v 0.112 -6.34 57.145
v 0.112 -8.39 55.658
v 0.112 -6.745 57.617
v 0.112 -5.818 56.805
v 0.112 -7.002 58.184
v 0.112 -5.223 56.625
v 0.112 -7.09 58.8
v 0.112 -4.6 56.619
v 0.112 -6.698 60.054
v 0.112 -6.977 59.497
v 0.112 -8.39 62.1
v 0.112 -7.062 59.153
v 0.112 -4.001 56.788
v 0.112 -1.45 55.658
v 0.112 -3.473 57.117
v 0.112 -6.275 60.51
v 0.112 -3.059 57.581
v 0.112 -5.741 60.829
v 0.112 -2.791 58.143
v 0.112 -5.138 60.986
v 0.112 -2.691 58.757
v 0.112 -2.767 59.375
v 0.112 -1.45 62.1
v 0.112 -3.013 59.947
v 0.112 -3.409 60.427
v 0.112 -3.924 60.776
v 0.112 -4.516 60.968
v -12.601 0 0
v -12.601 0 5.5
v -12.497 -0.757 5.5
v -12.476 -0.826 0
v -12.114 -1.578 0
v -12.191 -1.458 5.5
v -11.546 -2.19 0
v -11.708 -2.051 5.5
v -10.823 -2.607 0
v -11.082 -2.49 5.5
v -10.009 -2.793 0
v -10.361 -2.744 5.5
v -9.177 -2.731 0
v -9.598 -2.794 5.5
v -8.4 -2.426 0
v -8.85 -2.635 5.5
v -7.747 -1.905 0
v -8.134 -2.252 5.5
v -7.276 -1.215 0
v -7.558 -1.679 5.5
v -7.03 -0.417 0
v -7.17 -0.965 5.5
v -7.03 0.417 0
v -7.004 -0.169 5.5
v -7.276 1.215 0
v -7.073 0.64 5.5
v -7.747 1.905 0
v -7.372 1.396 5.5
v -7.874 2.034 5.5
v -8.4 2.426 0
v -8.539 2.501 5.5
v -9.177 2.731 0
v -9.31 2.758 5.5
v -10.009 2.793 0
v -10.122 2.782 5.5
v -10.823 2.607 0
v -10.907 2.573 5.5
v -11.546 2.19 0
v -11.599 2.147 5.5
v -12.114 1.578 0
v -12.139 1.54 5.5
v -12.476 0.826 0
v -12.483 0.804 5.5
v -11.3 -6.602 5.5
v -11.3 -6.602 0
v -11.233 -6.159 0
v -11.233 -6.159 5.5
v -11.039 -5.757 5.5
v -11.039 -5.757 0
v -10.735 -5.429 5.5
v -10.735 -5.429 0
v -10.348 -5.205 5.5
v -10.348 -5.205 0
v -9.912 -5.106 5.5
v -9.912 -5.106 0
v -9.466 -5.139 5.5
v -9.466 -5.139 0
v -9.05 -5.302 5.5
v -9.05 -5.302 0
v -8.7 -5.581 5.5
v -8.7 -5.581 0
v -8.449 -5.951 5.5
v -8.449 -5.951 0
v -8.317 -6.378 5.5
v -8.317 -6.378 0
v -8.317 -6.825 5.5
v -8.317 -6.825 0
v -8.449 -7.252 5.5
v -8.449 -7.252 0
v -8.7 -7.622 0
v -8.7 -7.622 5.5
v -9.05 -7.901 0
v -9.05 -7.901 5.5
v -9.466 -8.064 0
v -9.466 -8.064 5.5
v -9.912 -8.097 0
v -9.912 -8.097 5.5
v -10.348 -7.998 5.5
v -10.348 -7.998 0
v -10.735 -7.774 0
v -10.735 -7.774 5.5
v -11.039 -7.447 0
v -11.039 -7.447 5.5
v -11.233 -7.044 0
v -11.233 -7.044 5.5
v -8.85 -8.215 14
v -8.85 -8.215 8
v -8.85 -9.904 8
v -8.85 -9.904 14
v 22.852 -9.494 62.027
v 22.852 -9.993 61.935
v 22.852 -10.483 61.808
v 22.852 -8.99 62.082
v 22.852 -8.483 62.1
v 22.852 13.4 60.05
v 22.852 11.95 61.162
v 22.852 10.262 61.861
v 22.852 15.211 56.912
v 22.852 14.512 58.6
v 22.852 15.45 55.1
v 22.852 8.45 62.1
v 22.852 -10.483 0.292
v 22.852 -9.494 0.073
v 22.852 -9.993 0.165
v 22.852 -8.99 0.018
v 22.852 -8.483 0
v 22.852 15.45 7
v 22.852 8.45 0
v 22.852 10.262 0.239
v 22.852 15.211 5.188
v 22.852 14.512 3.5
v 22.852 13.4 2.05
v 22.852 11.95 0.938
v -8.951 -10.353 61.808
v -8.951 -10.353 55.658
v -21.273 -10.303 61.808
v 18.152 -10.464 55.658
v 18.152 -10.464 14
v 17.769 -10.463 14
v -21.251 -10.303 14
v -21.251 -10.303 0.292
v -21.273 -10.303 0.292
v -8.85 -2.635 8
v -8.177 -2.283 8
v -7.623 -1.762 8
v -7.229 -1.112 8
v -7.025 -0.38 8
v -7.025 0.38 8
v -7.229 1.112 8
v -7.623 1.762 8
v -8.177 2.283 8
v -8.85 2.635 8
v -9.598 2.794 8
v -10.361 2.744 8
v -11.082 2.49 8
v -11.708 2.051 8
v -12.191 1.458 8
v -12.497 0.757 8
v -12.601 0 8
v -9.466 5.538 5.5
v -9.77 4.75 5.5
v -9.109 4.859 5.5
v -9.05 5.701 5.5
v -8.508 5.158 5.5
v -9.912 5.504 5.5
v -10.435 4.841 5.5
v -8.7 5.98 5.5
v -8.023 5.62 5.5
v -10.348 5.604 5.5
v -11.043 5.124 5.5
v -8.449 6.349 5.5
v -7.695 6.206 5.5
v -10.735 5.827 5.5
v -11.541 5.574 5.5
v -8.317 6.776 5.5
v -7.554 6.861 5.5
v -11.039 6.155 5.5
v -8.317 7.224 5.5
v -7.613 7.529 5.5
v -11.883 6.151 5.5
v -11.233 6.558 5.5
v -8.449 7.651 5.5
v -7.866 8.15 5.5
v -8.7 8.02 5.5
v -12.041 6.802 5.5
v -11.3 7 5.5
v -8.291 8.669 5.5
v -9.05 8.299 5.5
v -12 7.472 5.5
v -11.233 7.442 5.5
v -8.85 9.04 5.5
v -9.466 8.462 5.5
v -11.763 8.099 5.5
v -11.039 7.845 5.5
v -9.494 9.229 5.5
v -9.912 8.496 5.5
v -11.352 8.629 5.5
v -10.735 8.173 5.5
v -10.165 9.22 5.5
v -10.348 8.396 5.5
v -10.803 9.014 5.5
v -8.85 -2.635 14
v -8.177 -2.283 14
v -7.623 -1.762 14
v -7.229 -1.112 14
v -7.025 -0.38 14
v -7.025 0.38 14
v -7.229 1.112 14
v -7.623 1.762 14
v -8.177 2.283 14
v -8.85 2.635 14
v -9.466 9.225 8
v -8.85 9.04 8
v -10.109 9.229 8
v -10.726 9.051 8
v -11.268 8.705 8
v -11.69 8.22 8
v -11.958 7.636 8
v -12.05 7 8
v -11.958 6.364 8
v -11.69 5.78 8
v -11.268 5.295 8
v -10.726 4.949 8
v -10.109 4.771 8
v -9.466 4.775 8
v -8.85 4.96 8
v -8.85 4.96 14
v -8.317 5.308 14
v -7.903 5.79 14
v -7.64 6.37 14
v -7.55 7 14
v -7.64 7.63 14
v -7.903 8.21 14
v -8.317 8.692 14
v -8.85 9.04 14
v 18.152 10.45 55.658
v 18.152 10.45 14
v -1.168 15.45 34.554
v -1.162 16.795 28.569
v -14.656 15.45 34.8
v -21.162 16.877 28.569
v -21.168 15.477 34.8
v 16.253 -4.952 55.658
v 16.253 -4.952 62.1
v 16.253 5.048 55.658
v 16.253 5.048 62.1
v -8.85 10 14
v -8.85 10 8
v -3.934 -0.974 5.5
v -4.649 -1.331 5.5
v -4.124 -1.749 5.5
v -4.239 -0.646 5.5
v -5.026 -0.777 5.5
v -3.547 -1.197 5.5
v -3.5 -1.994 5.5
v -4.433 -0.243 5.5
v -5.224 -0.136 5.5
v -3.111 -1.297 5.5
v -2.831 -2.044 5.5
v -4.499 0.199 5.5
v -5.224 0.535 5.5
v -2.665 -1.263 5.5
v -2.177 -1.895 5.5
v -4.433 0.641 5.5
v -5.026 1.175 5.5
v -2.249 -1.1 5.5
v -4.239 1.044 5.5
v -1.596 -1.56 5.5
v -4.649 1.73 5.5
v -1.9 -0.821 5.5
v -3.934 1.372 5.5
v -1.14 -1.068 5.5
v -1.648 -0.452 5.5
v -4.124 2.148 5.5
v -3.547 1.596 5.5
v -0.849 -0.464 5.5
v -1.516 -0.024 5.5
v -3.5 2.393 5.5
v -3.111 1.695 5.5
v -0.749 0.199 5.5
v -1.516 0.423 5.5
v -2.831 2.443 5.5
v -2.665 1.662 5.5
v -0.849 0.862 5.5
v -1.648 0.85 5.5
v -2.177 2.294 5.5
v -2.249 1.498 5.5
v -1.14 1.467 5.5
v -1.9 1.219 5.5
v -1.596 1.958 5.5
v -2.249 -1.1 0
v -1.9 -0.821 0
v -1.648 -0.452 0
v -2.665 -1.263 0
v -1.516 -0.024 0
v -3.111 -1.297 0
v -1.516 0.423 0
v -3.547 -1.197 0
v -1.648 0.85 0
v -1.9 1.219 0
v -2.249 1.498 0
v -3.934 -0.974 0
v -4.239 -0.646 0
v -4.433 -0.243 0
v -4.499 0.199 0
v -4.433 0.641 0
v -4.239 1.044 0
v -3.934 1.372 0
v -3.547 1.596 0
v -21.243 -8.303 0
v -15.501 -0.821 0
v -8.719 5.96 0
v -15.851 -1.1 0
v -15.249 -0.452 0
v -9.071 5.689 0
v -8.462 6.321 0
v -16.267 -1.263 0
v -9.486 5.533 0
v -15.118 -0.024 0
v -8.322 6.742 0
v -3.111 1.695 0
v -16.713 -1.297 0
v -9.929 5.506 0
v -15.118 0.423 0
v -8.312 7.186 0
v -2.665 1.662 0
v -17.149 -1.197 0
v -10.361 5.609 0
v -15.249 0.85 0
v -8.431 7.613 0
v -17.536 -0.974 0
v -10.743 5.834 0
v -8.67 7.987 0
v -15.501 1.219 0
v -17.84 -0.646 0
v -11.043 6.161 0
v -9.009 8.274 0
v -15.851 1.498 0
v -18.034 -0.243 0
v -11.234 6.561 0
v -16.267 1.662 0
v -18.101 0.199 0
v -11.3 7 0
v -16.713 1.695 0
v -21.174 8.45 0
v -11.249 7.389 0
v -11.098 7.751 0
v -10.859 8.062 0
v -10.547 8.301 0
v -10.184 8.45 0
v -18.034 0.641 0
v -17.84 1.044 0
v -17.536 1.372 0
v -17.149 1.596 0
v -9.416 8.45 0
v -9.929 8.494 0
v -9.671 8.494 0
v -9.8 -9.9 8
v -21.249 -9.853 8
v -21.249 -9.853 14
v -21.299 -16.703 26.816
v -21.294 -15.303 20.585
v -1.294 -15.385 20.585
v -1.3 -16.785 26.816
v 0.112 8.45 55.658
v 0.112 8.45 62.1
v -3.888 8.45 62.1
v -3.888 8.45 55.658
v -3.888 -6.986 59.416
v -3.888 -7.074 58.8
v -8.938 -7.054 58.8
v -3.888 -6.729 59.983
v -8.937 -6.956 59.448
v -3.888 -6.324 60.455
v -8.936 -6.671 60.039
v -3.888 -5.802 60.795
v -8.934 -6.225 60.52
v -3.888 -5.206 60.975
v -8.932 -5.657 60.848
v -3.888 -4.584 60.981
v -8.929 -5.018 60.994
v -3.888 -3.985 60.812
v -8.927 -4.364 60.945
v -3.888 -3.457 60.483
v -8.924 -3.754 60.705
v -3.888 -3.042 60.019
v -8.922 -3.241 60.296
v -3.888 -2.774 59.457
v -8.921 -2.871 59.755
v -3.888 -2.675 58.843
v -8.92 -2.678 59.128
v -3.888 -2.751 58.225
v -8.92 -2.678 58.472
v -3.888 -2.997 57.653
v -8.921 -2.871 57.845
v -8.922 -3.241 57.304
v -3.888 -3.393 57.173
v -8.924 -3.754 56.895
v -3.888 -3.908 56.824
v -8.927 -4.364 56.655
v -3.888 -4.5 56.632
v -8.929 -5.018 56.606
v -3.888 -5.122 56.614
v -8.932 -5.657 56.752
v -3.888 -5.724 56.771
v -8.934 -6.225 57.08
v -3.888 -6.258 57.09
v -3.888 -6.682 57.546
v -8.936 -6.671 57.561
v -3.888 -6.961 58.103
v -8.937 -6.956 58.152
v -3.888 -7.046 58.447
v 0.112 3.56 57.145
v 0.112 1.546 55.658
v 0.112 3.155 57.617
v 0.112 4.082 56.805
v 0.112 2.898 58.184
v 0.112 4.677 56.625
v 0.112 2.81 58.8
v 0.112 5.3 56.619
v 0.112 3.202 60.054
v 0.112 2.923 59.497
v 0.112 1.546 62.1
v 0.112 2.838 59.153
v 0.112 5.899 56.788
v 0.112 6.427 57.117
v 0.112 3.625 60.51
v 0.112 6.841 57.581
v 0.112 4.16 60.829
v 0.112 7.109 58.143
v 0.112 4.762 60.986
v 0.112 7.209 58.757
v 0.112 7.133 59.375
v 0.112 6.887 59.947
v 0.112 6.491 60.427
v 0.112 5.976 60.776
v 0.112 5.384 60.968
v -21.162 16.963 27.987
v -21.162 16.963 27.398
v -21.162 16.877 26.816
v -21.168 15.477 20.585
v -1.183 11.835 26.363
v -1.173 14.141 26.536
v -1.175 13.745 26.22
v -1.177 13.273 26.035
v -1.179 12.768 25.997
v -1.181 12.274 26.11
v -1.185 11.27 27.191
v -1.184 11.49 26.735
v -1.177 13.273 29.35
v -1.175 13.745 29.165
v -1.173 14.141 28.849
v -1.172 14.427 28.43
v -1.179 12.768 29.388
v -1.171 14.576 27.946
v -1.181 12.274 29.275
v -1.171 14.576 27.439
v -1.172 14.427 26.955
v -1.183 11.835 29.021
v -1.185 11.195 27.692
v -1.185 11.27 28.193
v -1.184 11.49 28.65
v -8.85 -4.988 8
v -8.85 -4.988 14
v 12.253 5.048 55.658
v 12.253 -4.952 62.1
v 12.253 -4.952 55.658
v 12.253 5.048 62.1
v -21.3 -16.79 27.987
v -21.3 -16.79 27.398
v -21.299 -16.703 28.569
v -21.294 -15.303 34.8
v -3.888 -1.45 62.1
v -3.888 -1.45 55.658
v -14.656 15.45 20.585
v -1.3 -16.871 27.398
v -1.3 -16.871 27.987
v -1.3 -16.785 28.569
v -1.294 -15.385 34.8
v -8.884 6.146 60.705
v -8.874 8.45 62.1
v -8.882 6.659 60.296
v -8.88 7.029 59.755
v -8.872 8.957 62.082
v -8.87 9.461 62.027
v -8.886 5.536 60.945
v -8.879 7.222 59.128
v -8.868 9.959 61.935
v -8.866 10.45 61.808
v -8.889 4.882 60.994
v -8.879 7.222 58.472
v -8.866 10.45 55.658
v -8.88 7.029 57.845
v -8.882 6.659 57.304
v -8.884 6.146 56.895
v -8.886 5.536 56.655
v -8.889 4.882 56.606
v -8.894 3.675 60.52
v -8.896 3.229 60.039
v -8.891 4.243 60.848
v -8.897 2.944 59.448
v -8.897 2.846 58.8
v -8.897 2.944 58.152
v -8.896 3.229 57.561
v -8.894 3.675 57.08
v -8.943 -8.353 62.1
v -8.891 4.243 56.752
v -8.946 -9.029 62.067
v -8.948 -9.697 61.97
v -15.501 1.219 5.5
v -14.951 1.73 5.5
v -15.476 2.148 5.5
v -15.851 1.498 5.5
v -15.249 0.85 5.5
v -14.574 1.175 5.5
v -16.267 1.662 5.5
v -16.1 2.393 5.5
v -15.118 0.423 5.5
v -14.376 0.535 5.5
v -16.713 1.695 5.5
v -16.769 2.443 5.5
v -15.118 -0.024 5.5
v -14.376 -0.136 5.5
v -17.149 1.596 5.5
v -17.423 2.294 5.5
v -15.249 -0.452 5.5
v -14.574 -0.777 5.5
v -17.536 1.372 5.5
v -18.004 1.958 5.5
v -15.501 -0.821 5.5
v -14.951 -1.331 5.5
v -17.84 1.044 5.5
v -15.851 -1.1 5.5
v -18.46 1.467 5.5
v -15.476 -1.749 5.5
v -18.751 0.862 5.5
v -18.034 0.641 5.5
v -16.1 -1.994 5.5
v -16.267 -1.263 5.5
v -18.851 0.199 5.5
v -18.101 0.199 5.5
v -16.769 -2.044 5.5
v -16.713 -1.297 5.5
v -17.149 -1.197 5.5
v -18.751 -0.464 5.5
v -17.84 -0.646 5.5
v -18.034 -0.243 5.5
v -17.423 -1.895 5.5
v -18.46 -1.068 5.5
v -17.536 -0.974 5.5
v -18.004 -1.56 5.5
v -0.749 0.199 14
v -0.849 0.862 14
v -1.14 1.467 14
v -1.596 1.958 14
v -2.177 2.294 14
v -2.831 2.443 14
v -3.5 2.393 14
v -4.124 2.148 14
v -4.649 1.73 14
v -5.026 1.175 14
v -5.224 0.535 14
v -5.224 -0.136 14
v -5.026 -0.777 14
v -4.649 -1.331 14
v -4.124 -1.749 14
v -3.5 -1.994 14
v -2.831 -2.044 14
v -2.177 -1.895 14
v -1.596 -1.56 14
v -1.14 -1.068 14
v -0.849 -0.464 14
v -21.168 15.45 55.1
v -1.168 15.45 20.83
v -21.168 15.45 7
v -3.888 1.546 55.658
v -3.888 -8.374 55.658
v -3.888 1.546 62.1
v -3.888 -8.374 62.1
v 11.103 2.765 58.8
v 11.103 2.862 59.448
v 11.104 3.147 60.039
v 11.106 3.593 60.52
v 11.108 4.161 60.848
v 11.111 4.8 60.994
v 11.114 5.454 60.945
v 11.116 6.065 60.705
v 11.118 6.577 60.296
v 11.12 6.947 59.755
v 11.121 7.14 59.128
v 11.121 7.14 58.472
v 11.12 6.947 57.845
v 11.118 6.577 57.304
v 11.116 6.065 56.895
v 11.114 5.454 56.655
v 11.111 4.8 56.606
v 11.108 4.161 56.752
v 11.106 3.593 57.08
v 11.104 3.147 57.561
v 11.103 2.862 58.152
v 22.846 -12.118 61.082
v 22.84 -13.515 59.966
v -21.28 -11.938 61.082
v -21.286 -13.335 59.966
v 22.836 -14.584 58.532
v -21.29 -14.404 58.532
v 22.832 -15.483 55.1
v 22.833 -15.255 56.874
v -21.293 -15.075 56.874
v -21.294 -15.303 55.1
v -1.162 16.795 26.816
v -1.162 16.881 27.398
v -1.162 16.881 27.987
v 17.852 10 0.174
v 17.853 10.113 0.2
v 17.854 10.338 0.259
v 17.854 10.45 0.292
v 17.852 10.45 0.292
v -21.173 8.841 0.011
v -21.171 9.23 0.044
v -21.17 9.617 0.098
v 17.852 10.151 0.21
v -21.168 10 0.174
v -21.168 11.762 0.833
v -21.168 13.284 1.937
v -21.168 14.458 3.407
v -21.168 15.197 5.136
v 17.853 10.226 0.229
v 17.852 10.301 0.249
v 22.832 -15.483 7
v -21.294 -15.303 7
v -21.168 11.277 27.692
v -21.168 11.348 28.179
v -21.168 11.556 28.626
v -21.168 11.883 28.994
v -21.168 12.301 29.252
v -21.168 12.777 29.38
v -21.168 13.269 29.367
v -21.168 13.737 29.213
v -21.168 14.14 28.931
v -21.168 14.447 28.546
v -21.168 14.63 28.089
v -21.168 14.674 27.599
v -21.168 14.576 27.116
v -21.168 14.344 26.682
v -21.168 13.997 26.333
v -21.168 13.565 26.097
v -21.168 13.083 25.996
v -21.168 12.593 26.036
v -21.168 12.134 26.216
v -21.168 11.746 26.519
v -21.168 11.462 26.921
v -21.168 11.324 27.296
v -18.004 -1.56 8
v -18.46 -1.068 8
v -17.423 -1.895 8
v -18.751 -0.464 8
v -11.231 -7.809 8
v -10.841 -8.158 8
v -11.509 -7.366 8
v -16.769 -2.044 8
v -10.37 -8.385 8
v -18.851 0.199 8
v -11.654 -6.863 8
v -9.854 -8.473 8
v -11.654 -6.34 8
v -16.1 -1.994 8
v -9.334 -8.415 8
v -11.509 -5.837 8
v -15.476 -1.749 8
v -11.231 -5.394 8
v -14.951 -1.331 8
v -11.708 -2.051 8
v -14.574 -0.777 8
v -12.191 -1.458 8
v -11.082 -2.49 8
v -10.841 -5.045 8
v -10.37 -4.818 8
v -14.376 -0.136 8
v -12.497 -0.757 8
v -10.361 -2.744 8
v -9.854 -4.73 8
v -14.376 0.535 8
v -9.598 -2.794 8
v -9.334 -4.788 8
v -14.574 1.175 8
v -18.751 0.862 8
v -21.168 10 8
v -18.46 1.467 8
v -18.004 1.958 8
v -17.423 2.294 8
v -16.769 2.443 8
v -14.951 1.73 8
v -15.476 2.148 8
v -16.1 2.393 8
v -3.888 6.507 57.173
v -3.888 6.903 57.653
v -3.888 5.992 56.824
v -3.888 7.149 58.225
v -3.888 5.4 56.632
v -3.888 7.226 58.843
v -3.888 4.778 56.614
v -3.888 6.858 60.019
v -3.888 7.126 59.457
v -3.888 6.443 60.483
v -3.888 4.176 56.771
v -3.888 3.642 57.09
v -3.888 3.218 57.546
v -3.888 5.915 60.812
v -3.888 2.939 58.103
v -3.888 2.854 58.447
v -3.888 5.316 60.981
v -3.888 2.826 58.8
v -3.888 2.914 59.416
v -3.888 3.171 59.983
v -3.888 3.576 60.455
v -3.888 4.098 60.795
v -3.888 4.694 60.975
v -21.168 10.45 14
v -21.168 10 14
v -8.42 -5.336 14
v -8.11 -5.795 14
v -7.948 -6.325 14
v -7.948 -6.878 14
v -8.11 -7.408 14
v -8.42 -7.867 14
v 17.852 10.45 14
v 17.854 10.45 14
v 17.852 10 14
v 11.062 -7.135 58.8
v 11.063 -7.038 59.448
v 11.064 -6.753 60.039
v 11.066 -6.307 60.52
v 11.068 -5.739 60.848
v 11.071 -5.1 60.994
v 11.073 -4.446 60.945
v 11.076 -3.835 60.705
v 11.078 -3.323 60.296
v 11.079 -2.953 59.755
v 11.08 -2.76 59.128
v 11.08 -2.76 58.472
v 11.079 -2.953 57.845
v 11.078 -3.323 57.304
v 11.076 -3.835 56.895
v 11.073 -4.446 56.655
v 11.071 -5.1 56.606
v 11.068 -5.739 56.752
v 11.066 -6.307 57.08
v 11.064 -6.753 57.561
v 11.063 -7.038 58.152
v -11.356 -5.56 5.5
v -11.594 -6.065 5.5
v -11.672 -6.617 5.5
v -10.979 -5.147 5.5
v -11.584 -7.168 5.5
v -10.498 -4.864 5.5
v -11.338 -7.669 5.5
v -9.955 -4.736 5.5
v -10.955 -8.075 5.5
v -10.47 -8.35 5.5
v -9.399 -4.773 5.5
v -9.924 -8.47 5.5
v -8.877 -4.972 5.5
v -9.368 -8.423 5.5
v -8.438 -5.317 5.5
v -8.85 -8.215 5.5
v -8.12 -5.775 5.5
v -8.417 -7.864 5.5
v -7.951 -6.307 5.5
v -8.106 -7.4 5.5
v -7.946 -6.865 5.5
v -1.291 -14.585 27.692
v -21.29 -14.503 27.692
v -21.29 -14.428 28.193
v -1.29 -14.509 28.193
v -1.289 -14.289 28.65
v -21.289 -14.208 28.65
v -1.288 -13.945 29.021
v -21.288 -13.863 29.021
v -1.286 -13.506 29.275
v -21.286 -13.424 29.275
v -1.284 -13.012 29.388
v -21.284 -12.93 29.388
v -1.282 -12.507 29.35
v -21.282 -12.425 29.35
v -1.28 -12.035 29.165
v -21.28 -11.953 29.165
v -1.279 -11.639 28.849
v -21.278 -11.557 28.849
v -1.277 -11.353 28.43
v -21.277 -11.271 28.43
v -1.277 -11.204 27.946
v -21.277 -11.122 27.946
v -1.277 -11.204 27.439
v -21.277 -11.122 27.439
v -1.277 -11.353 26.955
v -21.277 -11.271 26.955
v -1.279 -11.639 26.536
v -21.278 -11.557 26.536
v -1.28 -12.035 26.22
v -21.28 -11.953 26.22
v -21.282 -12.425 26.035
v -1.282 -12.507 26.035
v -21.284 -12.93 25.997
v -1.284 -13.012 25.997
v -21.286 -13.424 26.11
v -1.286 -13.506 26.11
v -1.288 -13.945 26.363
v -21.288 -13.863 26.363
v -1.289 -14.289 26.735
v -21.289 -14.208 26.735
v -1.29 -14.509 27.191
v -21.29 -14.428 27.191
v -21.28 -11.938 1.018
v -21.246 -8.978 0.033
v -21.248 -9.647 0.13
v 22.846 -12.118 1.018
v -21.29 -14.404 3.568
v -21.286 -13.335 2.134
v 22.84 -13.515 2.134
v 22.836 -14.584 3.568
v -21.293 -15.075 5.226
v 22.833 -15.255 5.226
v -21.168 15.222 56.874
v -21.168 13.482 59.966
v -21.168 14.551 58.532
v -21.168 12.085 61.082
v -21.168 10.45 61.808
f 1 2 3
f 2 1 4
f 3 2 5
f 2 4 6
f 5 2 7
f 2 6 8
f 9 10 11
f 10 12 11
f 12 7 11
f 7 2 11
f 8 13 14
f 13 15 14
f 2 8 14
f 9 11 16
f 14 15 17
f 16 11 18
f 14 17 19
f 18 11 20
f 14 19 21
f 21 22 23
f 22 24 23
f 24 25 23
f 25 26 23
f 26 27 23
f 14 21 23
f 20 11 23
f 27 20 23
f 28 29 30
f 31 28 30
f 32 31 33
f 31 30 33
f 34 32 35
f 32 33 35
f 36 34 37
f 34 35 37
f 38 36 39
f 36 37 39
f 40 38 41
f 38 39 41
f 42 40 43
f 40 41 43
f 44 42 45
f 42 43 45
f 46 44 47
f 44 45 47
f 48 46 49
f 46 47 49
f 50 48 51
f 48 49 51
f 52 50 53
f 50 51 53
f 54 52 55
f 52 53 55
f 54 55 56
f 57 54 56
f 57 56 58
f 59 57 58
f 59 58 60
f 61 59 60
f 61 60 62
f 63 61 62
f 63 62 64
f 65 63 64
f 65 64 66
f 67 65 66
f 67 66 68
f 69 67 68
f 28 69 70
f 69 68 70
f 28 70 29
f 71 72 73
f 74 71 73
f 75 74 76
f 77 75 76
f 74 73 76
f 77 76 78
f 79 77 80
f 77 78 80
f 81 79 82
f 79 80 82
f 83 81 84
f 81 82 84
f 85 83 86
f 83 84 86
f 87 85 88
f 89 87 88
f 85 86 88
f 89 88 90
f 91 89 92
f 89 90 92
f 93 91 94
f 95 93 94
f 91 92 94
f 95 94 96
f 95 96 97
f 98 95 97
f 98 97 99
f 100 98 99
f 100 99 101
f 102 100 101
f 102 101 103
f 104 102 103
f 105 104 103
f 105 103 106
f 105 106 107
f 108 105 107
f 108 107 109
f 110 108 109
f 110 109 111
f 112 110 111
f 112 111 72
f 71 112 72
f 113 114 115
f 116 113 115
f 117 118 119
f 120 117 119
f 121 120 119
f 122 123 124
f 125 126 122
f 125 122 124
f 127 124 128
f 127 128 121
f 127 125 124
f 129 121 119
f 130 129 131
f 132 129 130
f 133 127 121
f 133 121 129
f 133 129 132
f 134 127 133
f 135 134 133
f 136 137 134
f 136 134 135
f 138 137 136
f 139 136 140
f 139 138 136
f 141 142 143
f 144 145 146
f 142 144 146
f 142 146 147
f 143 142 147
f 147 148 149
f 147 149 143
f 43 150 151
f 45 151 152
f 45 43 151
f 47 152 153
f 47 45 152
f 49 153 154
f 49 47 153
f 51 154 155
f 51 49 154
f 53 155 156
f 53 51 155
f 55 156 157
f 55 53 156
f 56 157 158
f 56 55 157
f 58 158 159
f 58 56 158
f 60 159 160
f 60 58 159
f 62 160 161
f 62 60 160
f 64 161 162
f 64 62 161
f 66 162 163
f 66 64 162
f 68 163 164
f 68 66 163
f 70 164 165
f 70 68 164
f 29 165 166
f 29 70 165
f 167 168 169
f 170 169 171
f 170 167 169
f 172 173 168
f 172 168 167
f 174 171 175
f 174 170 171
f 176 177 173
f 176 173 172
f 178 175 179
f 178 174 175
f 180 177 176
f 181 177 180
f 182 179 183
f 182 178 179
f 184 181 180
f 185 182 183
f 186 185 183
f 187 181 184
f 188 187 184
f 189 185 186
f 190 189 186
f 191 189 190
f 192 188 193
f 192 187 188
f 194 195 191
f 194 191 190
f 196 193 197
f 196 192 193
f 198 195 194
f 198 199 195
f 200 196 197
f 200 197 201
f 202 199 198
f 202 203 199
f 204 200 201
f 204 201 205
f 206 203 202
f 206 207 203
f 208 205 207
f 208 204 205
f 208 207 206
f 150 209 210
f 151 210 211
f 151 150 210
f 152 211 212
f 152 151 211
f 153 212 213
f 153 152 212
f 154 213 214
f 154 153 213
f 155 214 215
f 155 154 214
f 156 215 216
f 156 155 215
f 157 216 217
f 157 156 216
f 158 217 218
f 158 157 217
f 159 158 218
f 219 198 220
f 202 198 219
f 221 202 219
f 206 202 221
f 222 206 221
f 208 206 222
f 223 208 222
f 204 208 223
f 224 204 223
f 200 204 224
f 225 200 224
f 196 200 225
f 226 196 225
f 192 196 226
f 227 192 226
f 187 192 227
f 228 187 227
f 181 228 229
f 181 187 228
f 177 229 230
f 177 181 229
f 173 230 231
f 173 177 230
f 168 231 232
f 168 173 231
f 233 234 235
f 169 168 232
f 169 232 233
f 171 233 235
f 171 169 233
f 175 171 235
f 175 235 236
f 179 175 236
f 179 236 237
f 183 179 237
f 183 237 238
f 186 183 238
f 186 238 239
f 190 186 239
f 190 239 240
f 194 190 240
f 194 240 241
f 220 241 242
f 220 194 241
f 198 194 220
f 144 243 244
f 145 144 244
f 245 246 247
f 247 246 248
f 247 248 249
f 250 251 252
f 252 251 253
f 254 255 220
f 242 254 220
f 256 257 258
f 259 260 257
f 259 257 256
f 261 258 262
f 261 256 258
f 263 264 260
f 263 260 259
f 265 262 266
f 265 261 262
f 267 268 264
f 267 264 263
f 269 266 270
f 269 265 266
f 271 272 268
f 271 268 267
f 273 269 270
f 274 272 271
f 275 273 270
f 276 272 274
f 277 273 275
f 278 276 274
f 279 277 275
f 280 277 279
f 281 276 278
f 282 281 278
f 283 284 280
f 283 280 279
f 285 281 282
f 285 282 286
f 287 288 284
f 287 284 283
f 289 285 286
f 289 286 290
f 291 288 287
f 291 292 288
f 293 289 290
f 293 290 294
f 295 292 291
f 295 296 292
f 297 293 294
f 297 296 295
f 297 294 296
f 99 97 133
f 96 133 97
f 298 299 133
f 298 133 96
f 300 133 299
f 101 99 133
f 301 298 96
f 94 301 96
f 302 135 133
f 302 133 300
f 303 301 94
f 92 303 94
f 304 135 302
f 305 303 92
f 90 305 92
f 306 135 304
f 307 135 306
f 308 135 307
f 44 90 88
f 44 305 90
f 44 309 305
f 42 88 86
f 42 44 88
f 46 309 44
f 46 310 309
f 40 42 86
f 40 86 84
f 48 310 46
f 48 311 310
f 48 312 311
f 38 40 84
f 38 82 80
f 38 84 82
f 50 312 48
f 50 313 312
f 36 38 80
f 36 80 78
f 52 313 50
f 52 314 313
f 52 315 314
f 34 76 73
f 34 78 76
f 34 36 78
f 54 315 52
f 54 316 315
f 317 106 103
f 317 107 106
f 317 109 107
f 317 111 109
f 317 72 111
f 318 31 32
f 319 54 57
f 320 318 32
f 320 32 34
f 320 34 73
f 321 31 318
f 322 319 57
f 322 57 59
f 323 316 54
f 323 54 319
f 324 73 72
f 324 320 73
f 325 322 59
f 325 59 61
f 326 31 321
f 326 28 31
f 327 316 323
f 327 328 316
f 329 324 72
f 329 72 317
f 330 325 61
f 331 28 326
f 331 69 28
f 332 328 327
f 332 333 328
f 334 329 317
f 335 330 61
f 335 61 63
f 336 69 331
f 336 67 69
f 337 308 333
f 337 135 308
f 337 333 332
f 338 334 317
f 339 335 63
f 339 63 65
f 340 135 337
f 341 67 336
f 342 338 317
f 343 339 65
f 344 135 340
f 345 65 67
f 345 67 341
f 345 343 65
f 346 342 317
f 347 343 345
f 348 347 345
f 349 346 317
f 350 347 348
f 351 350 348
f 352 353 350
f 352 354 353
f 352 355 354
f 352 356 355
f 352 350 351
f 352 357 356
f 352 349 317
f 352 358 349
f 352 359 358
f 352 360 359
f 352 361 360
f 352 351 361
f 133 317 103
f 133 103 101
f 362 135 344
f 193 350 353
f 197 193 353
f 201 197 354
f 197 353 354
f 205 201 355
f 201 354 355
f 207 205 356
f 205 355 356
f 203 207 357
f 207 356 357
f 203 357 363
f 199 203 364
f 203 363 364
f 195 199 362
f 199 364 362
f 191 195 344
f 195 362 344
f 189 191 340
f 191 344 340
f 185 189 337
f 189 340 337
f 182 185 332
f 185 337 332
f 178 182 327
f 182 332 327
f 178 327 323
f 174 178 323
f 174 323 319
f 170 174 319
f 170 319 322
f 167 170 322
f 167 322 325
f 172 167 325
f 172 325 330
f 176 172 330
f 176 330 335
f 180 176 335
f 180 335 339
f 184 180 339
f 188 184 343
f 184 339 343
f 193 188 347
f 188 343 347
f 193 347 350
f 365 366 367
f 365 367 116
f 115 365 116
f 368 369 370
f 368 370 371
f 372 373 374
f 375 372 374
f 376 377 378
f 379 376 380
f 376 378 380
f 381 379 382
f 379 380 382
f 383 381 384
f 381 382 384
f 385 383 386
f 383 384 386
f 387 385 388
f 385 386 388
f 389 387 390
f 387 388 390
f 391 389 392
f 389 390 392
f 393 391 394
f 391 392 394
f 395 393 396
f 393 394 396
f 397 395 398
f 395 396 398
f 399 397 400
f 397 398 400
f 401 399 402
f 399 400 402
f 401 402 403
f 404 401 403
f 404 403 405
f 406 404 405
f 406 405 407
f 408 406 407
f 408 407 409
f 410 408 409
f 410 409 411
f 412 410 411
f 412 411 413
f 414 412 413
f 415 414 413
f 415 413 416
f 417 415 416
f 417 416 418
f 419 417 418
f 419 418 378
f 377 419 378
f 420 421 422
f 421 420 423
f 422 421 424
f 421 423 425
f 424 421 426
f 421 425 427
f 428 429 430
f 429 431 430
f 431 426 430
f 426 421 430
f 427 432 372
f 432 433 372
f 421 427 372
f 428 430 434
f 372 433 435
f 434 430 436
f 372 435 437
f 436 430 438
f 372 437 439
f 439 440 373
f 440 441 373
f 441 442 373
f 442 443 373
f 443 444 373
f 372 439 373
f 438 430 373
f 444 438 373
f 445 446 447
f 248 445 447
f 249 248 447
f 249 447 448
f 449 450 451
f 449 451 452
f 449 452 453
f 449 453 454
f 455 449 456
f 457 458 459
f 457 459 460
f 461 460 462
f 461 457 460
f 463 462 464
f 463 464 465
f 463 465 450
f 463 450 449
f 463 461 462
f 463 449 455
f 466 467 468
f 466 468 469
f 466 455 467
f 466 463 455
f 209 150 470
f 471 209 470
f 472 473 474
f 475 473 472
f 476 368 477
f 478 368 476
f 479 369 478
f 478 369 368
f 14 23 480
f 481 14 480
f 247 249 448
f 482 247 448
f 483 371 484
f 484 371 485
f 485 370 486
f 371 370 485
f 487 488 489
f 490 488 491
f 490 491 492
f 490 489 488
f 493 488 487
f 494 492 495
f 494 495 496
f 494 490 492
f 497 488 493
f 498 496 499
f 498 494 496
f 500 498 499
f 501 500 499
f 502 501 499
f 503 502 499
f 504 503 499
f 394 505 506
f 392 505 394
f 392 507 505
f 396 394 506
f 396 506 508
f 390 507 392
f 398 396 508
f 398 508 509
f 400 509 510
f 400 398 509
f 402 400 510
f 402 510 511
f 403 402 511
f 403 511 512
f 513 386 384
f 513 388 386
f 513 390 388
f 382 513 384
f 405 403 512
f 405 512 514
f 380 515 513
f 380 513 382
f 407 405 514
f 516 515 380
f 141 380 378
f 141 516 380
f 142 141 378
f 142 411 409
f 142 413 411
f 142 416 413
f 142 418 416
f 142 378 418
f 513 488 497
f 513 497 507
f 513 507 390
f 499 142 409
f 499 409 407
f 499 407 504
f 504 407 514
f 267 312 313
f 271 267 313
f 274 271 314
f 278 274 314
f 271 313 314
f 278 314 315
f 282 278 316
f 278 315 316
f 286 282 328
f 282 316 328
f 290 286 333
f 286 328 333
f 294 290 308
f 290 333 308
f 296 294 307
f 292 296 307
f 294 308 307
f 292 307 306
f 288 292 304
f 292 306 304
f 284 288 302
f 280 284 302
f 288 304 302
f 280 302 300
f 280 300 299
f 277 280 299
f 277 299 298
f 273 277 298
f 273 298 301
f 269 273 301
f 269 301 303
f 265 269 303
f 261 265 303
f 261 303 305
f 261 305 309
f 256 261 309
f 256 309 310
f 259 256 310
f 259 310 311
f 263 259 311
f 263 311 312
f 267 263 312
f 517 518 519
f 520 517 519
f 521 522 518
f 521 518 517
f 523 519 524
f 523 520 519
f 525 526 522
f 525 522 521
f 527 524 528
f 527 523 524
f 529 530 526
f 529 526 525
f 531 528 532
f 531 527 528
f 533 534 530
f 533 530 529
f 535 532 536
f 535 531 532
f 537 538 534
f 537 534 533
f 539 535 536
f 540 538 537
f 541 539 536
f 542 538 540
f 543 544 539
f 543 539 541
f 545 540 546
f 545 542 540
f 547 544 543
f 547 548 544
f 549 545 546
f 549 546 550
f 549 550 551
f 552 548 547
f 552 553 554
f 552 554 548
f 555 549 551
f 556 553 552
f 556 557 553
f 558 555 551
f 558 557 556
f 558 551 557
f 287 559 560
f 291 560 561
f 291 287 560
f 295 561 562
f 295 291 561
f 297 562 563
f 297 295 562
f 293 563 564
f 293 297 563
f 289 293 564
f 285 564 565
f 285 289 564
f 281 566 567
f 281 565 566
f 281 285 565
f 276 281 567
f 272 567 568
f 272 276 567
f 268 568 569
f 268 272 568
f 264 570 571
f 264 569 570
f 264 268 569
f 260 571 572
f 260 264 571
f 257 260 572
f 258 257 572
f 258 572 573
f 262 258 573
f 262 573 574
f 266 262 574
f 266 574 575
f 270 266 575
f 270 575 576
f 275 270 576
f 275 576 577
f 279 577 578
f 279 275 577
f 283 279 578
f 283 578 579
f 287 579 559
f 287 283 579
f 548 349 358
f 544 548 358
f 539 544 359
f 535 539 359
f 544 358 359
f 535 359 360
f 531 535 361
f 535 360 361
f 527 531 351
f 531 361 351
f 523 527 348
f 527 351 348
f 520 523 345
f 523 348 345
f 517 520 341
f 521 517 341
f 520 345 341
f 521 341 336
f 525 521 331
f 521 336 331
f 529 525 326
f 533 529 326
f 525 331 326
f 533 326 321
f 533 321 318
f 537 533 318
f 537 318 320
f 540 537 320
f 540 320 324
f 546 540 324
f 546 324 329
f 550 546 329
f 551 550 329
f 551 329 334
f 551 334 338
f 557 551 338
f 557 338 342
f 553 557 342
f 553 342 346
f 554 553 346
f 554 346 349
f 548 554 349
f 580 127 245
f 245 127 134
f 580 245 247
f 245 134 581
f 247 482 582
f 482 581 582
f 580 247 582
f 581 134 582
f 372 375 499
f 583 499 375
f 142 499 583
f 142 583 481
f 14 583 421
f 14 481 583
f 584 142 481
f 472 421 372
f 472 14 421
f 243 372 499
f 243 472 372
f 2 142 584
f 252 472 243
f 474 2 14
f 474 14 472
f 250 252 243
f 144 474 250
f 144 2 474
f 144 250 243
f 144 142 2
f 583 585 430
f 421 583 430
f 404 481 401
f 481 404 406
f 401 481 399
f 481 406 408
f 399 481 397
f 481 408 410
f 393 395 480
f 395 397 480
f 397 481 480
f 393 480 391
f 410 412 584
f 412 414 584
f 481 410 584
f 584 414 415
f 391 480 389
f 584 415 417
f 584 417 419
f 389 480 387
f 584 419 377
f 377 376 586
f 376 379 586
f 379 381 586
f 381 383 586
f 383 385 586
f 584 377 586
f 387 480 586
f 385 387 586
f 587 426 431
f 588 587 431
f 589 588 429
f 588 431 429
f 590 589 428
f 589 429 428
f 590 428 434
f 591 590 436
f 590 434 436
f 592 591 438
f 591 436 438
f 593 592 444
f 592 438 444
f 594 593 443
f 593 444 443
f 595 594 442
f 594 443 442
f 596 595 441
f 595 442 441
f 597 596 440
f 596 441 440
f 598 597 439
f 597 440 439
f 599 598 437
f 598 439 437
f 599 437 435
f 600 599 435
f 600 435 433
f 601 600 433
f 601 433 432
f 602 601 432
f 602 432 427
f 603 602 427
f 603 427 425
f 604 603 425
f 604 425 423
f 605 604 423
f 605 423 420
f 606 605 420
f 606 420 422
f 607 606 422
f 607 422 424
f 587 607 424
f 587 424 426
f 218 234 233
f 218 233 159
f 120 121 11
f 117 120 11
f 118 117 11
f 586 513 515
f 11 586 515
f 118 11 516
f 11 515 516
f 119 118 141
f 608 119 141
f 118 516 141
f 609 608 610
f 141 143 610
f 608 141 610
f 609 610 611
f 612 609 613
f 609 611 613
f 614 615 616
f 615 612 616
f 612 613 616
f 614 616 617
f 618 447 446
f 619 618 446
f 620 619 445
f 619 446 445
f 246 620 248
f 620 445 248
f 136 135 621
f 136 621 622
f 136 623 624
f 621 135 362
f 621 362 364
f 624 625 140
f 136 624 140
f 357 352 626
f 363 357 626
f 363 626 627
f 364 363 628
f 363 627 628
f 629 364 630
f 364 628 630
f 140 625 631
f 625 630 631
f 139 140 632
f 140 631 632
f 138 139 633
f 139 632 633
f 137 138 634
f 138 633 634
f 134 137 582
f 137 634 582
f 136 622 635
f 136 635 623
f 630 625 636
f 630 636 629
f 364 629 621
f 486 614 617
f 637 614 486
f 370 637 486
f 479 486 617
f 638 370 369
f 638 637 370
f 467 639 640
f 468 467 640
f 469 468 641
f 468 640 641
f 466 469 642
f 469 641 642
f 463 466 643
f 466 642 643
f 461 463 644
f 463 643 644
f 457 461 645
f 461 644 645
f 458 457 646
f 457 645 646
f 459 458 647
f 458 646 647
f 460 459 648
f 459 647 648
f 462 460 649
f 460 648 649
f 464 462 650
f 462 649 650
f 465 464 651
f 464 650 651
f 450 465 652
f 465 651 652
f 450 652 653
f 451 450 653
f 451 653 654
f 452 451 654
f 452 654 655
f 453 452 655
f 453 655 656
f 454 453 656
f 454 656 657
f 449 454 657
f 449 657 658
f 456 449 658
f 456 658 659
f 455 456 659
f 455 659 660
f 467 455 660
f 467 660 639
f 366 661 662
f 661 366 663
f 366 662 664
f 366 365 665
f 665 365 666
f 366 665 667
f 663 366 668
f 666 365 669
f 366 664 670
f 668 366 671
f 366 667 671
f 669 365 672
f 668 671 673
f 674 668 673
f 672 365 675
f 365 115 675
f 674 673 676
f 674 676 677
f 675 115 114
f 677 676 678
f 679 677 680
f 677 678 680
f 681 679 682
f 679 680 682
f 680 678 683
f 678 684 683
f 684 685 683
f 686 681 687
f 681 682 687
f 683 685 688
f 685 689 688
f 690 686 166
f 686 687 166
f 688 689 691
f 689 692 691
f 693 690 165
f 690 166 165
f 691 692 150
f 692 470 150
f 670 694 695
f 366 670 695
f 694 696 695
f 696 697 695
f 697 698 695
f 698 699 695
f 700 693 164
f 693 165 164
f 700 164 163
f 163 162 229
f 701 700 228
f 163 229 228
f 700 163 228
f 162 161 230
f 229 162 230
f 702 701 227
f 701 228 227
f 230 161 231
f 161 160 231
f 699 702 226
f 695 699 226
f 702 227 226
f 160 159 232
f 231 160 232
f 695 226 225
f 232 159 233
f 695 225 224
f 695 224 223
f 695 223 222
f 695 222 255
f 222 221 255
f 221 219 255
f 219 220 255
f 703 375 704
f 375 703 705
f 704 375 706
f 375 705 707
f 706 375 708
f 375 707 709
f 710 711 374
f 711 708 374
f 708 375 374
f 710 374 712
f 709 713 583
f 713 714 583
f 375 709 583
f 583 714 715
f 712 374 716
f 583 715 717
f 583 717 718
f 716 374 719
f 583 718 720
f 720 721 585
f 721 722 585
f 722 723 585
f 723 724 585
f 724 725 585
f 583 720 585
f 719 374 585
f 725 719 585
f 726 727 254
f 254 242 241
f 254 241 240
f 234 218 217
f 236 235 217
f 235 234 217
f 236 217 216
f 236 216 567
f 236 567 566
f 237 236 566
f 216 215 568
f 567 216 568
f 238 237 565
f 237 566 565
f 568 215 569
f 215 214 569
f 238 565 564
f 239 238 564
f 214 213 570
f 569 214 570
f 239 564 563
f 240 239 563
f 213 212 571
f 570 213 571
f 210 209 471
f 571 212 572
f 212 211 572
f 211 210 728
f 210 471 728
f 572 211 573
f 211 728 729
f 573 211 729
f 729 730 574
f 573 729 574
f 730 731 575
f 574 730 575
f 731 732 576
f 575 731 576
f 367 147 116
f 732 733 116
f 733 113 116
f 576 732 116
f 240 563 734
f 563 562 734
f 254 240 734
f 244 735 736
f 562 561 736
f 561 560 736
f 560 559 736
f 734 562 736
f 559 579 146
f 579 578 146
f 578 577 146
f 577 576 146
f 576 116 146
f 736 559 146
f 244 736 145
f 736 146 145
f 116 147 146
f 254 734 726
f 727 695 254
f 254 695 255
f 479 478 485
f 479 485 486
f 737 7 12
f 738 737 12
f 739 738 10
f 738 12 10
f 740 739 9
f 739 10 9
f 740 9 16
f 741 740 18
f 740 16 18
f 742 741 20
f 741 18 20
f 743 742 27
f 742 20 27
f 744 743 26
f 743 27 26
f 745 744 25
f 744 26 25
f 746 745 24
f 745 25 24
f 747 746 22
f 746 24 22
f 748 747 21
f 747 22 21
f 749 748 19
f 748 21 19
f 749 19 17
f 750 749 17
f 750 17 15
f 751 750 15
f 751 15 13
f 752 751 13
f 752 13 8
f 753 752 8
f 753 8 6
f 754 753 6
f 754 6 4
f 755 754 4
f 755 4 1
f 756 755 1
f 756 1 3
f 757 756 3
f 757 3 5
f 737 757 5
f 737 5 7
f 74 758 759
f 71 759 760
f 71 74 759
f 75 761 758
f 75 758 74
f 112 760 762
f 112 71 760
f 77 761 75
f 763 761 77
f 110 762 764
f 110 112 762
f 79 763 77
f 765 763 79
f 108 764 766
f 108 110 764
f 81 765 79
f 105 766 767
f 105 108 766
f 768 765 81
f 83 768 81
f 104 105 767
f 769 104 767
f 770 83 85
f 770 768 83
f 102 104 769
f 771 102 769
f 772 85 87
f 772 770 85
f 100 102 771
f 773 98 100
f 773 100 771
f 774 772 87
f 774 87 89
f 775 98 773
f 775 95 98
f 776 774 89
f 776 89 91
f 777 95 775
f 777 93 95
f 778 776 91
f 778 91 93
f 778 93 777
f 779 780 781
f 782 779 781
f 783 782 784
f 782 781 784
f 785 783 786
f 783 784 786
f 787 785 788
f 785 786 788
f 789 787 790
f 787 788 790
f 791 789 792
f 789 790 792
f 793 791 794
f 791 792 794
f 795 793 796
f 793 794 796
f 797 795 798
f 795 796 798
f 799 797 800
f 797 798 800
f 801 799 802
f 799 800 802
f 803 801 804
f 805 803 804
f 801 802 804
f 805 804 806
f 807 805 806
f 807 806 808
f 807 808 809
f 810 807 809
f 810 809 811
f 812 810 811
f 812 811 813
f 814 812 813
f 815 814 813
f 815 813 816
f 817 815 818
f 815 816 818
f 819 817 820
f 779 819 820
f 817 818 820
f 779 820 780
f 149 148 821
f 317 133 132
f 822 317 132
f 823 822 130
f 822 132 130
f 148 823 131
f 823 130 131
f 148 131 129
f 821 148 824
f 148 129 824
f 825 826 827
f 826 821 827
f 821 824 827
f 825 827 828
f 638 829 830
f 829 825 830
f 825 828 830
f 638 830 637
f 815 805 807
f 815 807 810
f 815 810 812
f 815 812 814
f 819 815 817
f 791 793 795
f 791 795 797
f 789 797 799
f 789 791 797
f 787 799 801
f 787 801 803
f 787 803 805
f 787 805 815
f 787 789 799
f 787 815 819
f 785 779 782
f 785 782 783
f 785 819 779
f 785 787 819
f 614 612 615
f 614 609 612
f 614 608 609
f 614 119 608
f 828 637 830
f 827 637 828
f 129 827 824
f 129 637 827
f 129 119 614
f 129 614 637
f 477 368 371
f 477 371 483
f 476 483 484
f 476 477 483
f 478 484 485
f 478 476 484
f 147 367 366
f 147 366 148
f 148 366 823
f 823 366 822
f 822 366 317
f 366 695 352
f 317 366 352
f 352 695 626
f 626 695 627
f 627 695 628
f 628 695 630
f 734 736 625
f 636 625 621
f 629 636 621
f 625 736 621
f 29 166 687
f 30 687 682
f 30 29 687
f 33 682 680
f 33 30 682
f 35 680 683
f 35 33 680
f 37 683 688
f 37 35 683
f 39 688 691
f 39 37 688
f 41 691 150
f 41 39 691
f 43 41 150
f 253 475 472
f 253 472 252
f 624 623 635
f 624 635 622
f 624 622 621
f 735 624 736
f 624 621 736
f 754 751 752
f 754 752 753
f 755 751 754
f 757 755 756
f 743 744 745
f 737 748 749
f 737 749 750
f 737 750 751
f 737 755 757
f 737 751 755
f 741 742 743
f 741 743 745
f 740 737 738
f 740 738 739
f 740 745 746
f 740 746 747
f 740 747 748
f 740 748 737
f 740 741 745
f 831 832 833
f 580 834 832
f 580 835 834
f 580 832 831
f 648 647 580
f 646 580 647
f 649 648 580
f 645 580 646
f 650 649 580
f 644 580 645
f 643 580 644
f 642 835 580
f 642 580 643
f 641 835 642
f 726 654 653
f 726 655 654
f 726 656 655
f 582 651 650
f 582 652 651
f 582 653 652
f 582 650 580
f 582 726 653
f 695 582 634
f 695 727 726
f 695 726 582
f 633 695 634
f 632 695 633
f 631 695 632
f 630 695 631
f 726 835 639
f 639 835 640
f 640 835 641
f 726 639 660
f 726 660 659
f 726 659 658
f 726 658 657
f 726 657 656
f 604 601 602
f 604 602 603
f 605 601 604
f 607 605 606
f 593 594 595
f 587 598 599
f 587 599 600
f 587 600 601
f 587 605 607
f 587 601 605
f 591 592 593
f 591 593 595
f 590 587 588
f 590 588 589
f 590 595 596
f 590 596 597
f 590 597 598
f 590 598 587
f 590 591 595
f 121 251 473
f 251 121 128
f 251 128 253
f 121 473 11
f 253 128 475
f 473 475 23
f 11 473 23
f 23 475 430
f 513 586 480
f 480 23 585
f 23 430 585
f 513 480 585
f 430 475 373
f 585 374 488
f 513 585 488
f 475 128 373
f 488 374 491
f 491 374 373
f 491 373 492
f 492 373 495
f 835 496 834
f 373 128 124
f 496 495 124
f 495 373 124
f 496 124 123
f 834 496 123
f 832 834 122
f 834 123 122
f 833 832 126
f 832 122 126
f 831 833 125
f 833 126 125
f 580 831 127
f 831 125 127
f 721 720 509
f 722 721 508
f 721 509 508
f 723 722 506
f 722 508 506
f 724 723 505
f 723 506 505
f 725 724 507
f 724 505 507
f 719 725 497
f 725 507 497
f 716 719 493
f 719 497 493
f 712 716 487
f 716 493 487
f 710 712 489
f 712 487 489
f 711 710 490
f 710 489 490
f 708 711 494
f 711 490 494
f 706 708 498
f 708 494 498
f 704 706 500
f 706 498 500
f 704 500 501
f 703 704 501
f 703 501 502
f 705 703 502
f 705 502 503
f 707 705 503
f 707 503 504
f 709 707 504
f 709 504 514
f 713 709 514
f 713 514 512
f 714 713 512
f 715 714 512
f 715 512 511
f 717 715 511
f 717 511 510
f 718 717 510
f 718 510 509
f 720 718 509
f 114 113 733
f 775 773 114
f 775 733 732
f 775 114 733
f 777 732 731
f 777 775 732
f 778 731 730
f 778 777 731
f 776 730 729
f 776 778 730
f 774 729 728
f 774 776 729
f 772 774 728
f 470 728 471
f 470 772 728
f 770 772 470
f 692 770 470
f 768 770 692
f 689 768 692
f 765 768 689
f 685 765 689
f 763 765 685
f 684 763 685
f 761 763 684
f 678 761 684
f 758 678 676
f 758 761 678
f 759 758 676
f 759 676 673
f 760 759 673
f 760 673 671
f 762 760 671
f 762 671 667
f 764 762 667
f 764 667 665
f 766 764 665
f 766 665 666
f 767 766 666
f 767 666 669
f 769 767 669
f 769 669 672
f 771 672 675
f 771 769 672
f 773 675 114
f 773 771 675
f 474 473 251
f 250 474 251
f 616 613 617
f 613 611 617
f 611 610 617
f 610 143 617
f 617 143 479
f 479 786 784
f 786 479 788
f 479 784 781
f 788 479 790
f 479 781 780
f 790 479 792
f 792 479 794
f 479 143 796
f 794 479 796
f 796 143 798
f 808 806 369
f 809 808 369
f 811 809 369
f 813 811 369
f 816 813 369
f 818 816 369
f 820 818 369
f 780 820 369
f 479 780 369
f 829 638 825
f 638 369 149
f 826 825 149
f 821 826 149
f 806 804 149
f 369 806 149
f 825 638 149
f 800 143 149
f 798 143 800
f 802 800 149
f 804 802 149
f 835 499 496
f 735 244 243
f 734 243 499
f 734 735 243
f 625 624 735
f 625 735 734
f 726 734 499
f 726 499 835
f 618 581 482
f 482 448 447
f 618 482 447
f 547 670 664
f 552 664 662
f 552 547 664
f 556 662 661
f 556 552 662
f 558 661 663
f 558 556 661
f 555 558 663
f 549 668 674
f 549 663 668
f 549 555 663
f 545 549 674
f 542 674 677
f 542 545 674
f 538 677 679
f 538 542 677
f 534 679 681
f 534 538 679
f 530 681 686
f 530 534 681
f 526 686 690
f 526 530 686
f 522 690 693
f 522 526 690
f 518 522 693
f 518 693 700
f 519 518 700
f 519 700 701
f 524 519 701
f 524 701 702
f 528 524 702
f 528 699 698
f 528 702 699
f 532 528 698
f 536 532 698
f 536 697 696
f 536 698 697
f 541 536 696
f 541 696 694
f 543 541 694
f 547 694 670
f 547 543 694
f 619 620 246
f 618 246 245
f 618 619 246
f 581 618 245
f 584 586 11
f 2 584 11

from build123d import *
from build123d.topology import SkipClean

# Parameters (mm, degrees)
BOSS_EXTRUDE1_DEPTH     = 8
BOSS_EXTRUDE2_REACH     = 29.616
SKETCH3_W               = 8
SKETCH3_H               = 20
BOSS_EXTRUDE3_DEPTH     = 6
SKETCH5_R               = 1.5
CUT_EXTRUDE1_DEPTH      = 30
CUT_EXTRUDE2_DEPTH      = 30
CUT_EXTRUDE2_DEPTH_BACK = 2.5
SKETCH6_R               = 1.872244448
SKETCH6_R_2             = 2.25
SKETCH6_R_3             = 2.800873709
SKETCH7_R               = 2.800873709
CUT_EXTRUDE3_DEPTH      = 32.5
BOSS_EXTRUDE4_DEPTH     = 0.45
BOSS_EXTRUDE5_REACH     = 34.303
SKETCH9_W               = 3.185015847
SKETCH9_H               = 14
SKETCH10_W              = 39.020325901
SKETCH10_H              = 14
BOSS_EXTRUDE6_DEPTH     = 0.45
BOSS_EXTRUDE7_DEPTH     = 5
BOSS_EXTRUDE8_REACH     = 71.397
SKETCH12_W              = 4.7
SKETCH12_H              = 62.1
BOSS_EXTRUDE10_REACH    = 73.051
BOSS_EXTRUDE12_REACH    = 73.051
SKETCH15_W              = 0.383636216
SKETCH15_H              = 14
SKETCH16_W              = 44.125949978
SKETCH16_H              = 62.1
BOSS_EXTRUDE13_DEPTH    = 5
FILLET1_R               = 7
SKETCH17_R              = 2.2
CUT_EXTRUDE8_DEPTH      = 20
CUT_EXTRUDE9_DEPTH      = 20
BOSS_EXTRUDE14_DEPTH    = 20
SKETCH20_R              = 1.7
CUT_EXTRUDE10_DEPTH     = 20
SKETCH21_W              = 4
SKETCH21_H              = 10
CUT_EXTRUDE11_DEPTH     = 11


with BuildPart() as part:
    # Sketch1 → Boss-Extrude1 (new body)
    with BuildSketch(Plane.XY):
        Polygon((-9.8, -9.9), (14.667227969, -10), (14.667227969, 10), (-9.8, 10), align=None)
    extrude(amount=BOSS_EXTRUDE1_DEPTH)

    # Boss-Extrude2: up to this plane
    boss_extrude2_end = Plane(origin=(-21.20832686, 0.146710491, 44.5), z_dir=(0.9999916479126735, -0.0040870655604918985, 1.0611945867115664e-14))
    # Sketch3 → Boss-Extrude2 (add, up to the surface)
    with BuildSketch(Plane.ZY.offset(9.8), mode=Mode.PRIVATE) as boss_extrude2_sk1:
        with Locations((4, 0)):
            Rectangle(SKETCH3_W, SKETCH3_H)
    boss_extrude2_tool1 = split(extrude(boss_extrude2_sk1.sketch, amount=BOSS_EXTRUDE2_REACH, mode=Mode.PRIVATE), bisect_by=boss_extrude2_end, keep=Keep.BOTH, mode=Mode.PRIVATE)
    add(boss_extrude2_tool1.solids().sort_by_distance((-9.8, 0, 4))[0])

    # Sketch4 → Boss-Extrude3 (add)
    with BuildSketch(Plane.XY.offset(8)):
        Polygon((14.667227969, 10), (-8.850453012, 10), (-8.850453012, -9.903880893), (14.667227969, -10), align=None)
    extrude(amount=BOSS_EXTRUDE3_DEPTH)

    # Sketch5 → Cut-Extrude1 (cut)
    with BuildSketch(Plane(origin=(0, 0, 0), x_dir=(-1, 0, 0), z_dir=(0, 0, -1))):
        with Locations((9.8, 7)):
            Circle(SKETCH5_R)
        with Locations((16.600765498, 0.199234502)):
            Circle(SKETCH5_R)
        with Locations((2.999234502, 0.199234502)):
            Circle(SKETCH5_R)
        with Locations((9.8, -6.601530997)):
            Circle(SKETCH5_R)
    extrude(amount=-CUT_EXTRUDE1_DEPTH, mode=Mode.SUBTRACT)

    # Sketch6 → Cut-Extrude2 (cut, two sides: drawn at the far end of the back side and taken through both)
    with BuildSketch(Plane.XY.offset(8).offset(-CUT_EXTRUDE2_DEPTH_BACK)):
        with Locations(Location((-9.8, -6.601530997, 0), (0, 0, 300.475535412))):
            Circle(SKETCH6_R)
        with Locations((-2.999234502, 0.199234502)):
            Circle(SKETCH6_R_2)
        with Locations(Location((-16.600765498, 0.199234502, 0), (0, 0, 180))):
            Circle(SKETCH6_R_2)
        with Locations(Location((-9.8, 7, 0), (0, 0, 65.037759798))):
            Circle(SKETCH6_R_2)
        with Locations(Location((-9.8, 0, 0), (0, 0, 289.81706499))):
            Circle(SKETCH6_R_3)
    extrude(amount=CUT_EXTRUDE2_DEPTH + CUT_EXTRUDE2_DEPTH_BACK, mode=Mode.SUBTRACT)

    # Sketch7 → Cut-Extrude3 (cut)
    with SkipClean():  # the faces are left unmerged after this step: merging them gives an invalid solid
        with BuildSketch(Plane.XY.offset(8)):
            with Locations(Location((-9.8, 0, 0), (0, 0, 180))):
                Circle(SKETCH7_R)
        extrude(amount=-CUT_EXTRUDE3_DEPTH, mode=Mode.SUBTRACT)
    add(part.part.scale(1), mode=Mode.REPLACE)  # the faces are merged on a copy

    # Sketch8 → Boss-Extrude4 (add)
    with BuildSketch(Plane(origin=(-0.040625311, -9.939887537, 0), x_dir=(-0.9999916479126736, 0.004087065560474376, 0), z_dir=(-0.004087065560474377, -0.9999916479126737, 0))):
        Polygon((21.208749342, -8), (21.208749342, -14), (-17.811250658, -14), (-17.811250658, 0), (21.208749342, 0), align=None)
    extrude(amount=BOSS_EXTRUDE4_DEPTH)

    # Boss-Extrude5: up to this face of the body (flat: up to its plane)
    boss_extrude5_end = Plane(part.part.faces().sort_by_distance((-1.218931766, 10, 6.308951595))[0])
    # Sketch9 → Boss-Extrude5 (add, up to the picked face)
    with BuildSketch(Plane(origin=(-0.040625311, -9.939887537, 0), x_dir=(0.9999916479126736, -0.004087065560474399, 0), z_dir=(0.0040870655604743995, 0.9999916479126737, 0)), mode=Mode.PRIVATE) as boss_extrude5_sk1:
        with Locations((16.218742735, -7)):
            Rectangle(SKETCH9_W, SKETCH9_H)
    boss_extrude5_tool1 = split(extrude(boss_extrude5_sk1.sketch, amount=BOSS_EXTRUDE5_REACH, mode=Mode.PRIVATE), bisect_by=boss_extrude5_end, keep=Keep.BOTH, mode=Mode.PRIVATE)
    add(boss_extrude5_tool1.solids().sort_by(Axis((16.177982, -10.006175, 7), (0.0040870655604743995, 0.9999916479126737, 0)))[0])

    # Sketch10 → Boss-Extrude6 (add)
    with BuildSketch(Plane(origin=(0, 10, 0), x_dir=(1, 0, 0), z_dir=(0, 1, 0))):
        with Locations((-1.657892534, -7)):
            Rectangle(SKETCH10_W, SKETCH10_H)
    extrude(amount=BOSS_EXTRUDE6_DEPTH)

    # Sketch11 → Boss-Extrude7 (add)
    with BuildSketch(Plane(origin=(0, 10.45, 0), x_dir=(1, 0, 0), z_dir=(0, 1, 0))):
        Polygon((-21.168055484, 0), (17.852270417, 0), (22.852270417, 0), (22.852270417, -55.1), (22.852270417, -62.1), (17.750476753, -62.1), (-21.168055484, -62.1), align=None)
    extrude(amount=BOSS_EXTRUDE7_DEPTH)

    # Boss-Extrude8: up to this plane
    boss_extrude8_end = Plane(origin=(-0.042464491, -10.389883779, 0), z_dir=(0.004087065560474399, 0.9999916479126736, 0))
    # Sketch12 → Boss-Extrude8 (add, up to the surface)
    with BuildSketch(Plane(origin=(0, 10.45, 0), x_dir=(-1, 0, 0), z_dir=(0, -1, 0)), mode=Mode.PRIVATE) as boss_extrude8_sk1:
        with Locations((-20.502270417, -31.05)):
            Rectangle(SKETCH12_W, SKETCH12_H)
    boss_extrude8_tool1 = split(extrude(boss_extrude8_sk1.sketch, amount=BOSS_EXTRUDE8_REACH, mode=Mode.PRIVATE), bisect_by=boss_extrude8_end, keep=Keep.BOTH, mode=Mode.PRIVATE)
    add(boss_extrude8_tool1.solids().sort_by_distance((20.50227, 10.45, 31.05))[0])

    # Boss-Extrude10: up to this plane
    boss_extrude10_end = Plane(origin=(0, 10.45, 0), z_dir=(0, -1, 0))
    # Sketch13 → Boss-Extrude10 (add, up to the surface)
    with BuildSketch(Plane(origin=(-0.042464491, -10.389883779, 0), x_dir=(-0.9999916479126736, 0.004087065560474399, 0), z_dir=(-0.0040870655604743995, -0.9999916479126737, 0)), mode=Mode.PRIVATE) as boss_extrude10_sk1:
        Polygon((8.908749342, -61.4), (8.908749342, -62.1), (-17.791250658, -62.1), (-18.194886874, -62.1), (-18.194886874, -55.657746708), (-17.791250658, -55.657746708), (8.908749342, -55.657746708), align=None)
    boss_extrude10_tool1 = split(extrude(boss_extrude10_sk1.sketch, amount=-BOSS_EXTRUDE10_REACH, mode=Mode.PRIVATE), bisect_by=boss_extrude10_end, keep=Keep.BOTH, mode=Mode.PRIVATE)
    add(boss_extrude10_tool1.solids().sort_by_distance((4.600565, -10.40886, 58.878873))[0])

    # Boss-Extrude12: up to this plane
    boss_extrude12_end = Plane(origin=(0, 10.45, 0), z_dir=(0, -1, 0))
    # Sketch15 → Boss-Extrude12 (add, up to the surface)
    with BuildSketch(Plane(origin=(-0.042464491, -10.389883779, 0), x_dir=(0.9999916479126736, -0.004087065560474399, 0), z_dir=(-0.0040870655604743995, -0.9999916479126737, 0)), mode=Mode.PRIVATE) as boss_extrude12_sk1:
        with Locations((18.003068766, 7)):
            Rectangle(SKETCH15_W, SKETCH15_H)
    boss_extrude12_tool1 = split(extrude(boss_extrude12_sk1.sketch, amount=-BOSS_EXTRUDE12_REACH, mode=Mode.PRIVATE), bisect_by=boss_extrude12_end, keep=Keep.BOTH, mode=Mode.PRIVATE)
    add(boss_extrude12_tool1.solids().sort_by_distance((17.960454, -10.463464, 7))[0])

    # Sketch16 → Boss-Extrude13 (add)
    with BuildSketch(Plane(origin=(-0.042464491, -10.389883779, 0), x_dir=(-0.9999916479126736, 0.004087065560474399, 0), z_dir=(-0.0040870655604743995, -0.9999916479126737, 0))):
        with Locations((-0.83195114, -31.05)):
            Rectangle(SKETCH16_W, SKETCH16_H)
    extrude(amount=BOSS_EXTRUDE13_DEPTH)

    # Fillet1
    # the kernel refuses this fillet: 7 mm, written as the material it takes off along each edge
    with BuildSketch(Plane(origin=(40.352270417, 15.45, 62.1), x_dir=(0, 0, -1), z_dir=(-1, 0, 0))) as fillet1_piece_1:
        with BuildLine():
            CenterArc((FILLET1_R, FILLET1_R), FILLET1_R, 180, 90)
            Line((0, FILLET1_R), (0, 0))
            Line((0, 0), (FILLET1_R, 0))
        make_face()
    extrude(amount=79.020325901, mode=Mode.SUBTRACT)
    with BuildSketch(Plane(origin=(-38.793600183, -15.231545785, 62.1), x_dir=(0.004087065560474399, 0.9999916479126735, 0), z_dir=(0.9999916479126737, -0.0040870655604743995, 0)), Plane(origin=(40.331688928, -15.55493873, 0), x_dir=(0.004087065560474399, 0.9999916479126735, 0), z_dir=(-0.9999916479126737, 0.0040870655604743995, 0))) as fillet1_piece_2:
        with BuildLine():
            CenterArc((FILLET1_R, -FILLET1_R), FILLET1_R, 90, 90)
            Line((0, -FILLET1_R), (0, 0))
            Line((0, 0), (FILLET1_R, 0))
        make_face()
    extrude(amount=79.125949978, mode=Mode.SUBTRACT)
    with BuildSketch(Plane(origin=(-38.668055484, 15.45, 0), x_dir=(0, -1, 0), z_dir=(1, 0, 0))) as fillet1_piece_3:
        with BuildLine():
            CenterArc((FILLET1_R, -FILLET1_R), FILLET1_R, 90, 90)
            Line((0, -FILLET1_R), (0, 0))
            Line((0, 0), (FILLET1_R, 0))
        make_face()
    extrude(amount=79.020325901, mode=Mode.SUBTRACT)

    # Sketch17 → Cut-Extrude8 (cut)
    with BuildSketch(Plane(origin=(-8.908674935, 0.036410643, 0), x_dir=(0, 0, 1), z_dir=(-0.9999916479126737, 0.0040870655604744, -8.326704424266156e-13))):
        with Locations(Location((58.8, -4.889970557, 0), (0, 0, 270))):
            Circle(SKETCH17_R)
        with Locations(Location((58.8, 5.010029443, 0), (0, 0, 270))):
            Circle(SKETCH17_R)
    extrude(amount=-CUT_EXTRUDE8_DEPTH, mode=Mode.SUBTRACT)

    # Sketch18 → Cut-Extrude9 (cut)
    with BuildSketch(Plane.XY.offset(62.1)):
        Polygon((-3.888198616, -4.949888082), (-3.888198616, -8.374149176), (0.111801384, -8.390497575), (0.111801384, -1.449888082), (-3.888198616, -1.449888082), align=None)
        Polygon((-3.888198616, 8.45), (-3.888198616, 5.046398242), (-3.888198616, 1.546398242), (0.111801384, 1.546398242), (0.111801384, 8.45), align=None)
    extrude(amount=-CUT_EXTRUDE9_DEPTH, mode=Mode.SUBTRACT)

    # Sketch19 → Boss-Extrude14 (add)
    with BuildSketch(Plane(origin=(-21.230846526, 0.086772586, 0), x_dir=(0, 0, 1), z_dir=(-0.9999916479126737, 0.0040870655604743995, 0))):
        with BuildLine():
            Line((34.799540996, -15.389970557), (27.692259446, -15.389970557))
            Line((27.692259446, -15.389970557), (20.584977895, -15.389970557))
            Line((20.584977895, -15.389970557), (26.815853016, -16.790117538))
            ThreePointArc((26.815853016, -16.790117538), (27.692259446, -16.887374052), (28.568665876, -16.790117538))
            Line((28.568665876, -16.790117538), (34.799540996, -15.389970557))
        make_face()
        with BuildLine():
            ThreePointArc((26.815853016, 16.790117538), (27.692259446, 16.887374052), (28.568665876, 16.790117538))
            Line((28.568665876, 16.790117538), (34.799540996, 15.389970557))
            Line((34.799540996, 15.389970557), (20.584977895, 15.389970557))
            Line((20.584977895, 15.389970557), (26.815853016, 16.790117538))
        make_face()
    extrude(amount=-BOSS_EXTRUDE14_DEPTH)

    # Sketch20 → Cut-Extrude10 (cut)
    with BuildSketch(Plane(origin=(-21.230846526, 0.086772586, 0), x_dir=(0, 0, 1), z_dir=(-0.9999916479126737, 0.0040870655604743995, 0))):
        with Locations(Location((27.692259446, -12.889970557, 0), (0, 0, 270))):
            Circle(SKETCH20_R)
        with Locations(Location((27.692259446, 12.889970557, 0), (0, 0, 270))):
            Circle(SKETCH20_R)
    extrude(amount=-CUT_EXTRUDE10_DEPTH, mode=Mode.SUBTRACT)

    # Sketch21 → Cut-Extrude11 (cut)
    with BuildSketch(Plane.XY.offset(62.1)):
        with Locations((14.253029049, 0.04825508)):
            Rectangle(SKETCH21_W, SKETCH21_H)
    extrude(amount=-CUT_EXTRUDE11_DEPTH, mode=Mode.SUBTRACT)


solid = part.part
